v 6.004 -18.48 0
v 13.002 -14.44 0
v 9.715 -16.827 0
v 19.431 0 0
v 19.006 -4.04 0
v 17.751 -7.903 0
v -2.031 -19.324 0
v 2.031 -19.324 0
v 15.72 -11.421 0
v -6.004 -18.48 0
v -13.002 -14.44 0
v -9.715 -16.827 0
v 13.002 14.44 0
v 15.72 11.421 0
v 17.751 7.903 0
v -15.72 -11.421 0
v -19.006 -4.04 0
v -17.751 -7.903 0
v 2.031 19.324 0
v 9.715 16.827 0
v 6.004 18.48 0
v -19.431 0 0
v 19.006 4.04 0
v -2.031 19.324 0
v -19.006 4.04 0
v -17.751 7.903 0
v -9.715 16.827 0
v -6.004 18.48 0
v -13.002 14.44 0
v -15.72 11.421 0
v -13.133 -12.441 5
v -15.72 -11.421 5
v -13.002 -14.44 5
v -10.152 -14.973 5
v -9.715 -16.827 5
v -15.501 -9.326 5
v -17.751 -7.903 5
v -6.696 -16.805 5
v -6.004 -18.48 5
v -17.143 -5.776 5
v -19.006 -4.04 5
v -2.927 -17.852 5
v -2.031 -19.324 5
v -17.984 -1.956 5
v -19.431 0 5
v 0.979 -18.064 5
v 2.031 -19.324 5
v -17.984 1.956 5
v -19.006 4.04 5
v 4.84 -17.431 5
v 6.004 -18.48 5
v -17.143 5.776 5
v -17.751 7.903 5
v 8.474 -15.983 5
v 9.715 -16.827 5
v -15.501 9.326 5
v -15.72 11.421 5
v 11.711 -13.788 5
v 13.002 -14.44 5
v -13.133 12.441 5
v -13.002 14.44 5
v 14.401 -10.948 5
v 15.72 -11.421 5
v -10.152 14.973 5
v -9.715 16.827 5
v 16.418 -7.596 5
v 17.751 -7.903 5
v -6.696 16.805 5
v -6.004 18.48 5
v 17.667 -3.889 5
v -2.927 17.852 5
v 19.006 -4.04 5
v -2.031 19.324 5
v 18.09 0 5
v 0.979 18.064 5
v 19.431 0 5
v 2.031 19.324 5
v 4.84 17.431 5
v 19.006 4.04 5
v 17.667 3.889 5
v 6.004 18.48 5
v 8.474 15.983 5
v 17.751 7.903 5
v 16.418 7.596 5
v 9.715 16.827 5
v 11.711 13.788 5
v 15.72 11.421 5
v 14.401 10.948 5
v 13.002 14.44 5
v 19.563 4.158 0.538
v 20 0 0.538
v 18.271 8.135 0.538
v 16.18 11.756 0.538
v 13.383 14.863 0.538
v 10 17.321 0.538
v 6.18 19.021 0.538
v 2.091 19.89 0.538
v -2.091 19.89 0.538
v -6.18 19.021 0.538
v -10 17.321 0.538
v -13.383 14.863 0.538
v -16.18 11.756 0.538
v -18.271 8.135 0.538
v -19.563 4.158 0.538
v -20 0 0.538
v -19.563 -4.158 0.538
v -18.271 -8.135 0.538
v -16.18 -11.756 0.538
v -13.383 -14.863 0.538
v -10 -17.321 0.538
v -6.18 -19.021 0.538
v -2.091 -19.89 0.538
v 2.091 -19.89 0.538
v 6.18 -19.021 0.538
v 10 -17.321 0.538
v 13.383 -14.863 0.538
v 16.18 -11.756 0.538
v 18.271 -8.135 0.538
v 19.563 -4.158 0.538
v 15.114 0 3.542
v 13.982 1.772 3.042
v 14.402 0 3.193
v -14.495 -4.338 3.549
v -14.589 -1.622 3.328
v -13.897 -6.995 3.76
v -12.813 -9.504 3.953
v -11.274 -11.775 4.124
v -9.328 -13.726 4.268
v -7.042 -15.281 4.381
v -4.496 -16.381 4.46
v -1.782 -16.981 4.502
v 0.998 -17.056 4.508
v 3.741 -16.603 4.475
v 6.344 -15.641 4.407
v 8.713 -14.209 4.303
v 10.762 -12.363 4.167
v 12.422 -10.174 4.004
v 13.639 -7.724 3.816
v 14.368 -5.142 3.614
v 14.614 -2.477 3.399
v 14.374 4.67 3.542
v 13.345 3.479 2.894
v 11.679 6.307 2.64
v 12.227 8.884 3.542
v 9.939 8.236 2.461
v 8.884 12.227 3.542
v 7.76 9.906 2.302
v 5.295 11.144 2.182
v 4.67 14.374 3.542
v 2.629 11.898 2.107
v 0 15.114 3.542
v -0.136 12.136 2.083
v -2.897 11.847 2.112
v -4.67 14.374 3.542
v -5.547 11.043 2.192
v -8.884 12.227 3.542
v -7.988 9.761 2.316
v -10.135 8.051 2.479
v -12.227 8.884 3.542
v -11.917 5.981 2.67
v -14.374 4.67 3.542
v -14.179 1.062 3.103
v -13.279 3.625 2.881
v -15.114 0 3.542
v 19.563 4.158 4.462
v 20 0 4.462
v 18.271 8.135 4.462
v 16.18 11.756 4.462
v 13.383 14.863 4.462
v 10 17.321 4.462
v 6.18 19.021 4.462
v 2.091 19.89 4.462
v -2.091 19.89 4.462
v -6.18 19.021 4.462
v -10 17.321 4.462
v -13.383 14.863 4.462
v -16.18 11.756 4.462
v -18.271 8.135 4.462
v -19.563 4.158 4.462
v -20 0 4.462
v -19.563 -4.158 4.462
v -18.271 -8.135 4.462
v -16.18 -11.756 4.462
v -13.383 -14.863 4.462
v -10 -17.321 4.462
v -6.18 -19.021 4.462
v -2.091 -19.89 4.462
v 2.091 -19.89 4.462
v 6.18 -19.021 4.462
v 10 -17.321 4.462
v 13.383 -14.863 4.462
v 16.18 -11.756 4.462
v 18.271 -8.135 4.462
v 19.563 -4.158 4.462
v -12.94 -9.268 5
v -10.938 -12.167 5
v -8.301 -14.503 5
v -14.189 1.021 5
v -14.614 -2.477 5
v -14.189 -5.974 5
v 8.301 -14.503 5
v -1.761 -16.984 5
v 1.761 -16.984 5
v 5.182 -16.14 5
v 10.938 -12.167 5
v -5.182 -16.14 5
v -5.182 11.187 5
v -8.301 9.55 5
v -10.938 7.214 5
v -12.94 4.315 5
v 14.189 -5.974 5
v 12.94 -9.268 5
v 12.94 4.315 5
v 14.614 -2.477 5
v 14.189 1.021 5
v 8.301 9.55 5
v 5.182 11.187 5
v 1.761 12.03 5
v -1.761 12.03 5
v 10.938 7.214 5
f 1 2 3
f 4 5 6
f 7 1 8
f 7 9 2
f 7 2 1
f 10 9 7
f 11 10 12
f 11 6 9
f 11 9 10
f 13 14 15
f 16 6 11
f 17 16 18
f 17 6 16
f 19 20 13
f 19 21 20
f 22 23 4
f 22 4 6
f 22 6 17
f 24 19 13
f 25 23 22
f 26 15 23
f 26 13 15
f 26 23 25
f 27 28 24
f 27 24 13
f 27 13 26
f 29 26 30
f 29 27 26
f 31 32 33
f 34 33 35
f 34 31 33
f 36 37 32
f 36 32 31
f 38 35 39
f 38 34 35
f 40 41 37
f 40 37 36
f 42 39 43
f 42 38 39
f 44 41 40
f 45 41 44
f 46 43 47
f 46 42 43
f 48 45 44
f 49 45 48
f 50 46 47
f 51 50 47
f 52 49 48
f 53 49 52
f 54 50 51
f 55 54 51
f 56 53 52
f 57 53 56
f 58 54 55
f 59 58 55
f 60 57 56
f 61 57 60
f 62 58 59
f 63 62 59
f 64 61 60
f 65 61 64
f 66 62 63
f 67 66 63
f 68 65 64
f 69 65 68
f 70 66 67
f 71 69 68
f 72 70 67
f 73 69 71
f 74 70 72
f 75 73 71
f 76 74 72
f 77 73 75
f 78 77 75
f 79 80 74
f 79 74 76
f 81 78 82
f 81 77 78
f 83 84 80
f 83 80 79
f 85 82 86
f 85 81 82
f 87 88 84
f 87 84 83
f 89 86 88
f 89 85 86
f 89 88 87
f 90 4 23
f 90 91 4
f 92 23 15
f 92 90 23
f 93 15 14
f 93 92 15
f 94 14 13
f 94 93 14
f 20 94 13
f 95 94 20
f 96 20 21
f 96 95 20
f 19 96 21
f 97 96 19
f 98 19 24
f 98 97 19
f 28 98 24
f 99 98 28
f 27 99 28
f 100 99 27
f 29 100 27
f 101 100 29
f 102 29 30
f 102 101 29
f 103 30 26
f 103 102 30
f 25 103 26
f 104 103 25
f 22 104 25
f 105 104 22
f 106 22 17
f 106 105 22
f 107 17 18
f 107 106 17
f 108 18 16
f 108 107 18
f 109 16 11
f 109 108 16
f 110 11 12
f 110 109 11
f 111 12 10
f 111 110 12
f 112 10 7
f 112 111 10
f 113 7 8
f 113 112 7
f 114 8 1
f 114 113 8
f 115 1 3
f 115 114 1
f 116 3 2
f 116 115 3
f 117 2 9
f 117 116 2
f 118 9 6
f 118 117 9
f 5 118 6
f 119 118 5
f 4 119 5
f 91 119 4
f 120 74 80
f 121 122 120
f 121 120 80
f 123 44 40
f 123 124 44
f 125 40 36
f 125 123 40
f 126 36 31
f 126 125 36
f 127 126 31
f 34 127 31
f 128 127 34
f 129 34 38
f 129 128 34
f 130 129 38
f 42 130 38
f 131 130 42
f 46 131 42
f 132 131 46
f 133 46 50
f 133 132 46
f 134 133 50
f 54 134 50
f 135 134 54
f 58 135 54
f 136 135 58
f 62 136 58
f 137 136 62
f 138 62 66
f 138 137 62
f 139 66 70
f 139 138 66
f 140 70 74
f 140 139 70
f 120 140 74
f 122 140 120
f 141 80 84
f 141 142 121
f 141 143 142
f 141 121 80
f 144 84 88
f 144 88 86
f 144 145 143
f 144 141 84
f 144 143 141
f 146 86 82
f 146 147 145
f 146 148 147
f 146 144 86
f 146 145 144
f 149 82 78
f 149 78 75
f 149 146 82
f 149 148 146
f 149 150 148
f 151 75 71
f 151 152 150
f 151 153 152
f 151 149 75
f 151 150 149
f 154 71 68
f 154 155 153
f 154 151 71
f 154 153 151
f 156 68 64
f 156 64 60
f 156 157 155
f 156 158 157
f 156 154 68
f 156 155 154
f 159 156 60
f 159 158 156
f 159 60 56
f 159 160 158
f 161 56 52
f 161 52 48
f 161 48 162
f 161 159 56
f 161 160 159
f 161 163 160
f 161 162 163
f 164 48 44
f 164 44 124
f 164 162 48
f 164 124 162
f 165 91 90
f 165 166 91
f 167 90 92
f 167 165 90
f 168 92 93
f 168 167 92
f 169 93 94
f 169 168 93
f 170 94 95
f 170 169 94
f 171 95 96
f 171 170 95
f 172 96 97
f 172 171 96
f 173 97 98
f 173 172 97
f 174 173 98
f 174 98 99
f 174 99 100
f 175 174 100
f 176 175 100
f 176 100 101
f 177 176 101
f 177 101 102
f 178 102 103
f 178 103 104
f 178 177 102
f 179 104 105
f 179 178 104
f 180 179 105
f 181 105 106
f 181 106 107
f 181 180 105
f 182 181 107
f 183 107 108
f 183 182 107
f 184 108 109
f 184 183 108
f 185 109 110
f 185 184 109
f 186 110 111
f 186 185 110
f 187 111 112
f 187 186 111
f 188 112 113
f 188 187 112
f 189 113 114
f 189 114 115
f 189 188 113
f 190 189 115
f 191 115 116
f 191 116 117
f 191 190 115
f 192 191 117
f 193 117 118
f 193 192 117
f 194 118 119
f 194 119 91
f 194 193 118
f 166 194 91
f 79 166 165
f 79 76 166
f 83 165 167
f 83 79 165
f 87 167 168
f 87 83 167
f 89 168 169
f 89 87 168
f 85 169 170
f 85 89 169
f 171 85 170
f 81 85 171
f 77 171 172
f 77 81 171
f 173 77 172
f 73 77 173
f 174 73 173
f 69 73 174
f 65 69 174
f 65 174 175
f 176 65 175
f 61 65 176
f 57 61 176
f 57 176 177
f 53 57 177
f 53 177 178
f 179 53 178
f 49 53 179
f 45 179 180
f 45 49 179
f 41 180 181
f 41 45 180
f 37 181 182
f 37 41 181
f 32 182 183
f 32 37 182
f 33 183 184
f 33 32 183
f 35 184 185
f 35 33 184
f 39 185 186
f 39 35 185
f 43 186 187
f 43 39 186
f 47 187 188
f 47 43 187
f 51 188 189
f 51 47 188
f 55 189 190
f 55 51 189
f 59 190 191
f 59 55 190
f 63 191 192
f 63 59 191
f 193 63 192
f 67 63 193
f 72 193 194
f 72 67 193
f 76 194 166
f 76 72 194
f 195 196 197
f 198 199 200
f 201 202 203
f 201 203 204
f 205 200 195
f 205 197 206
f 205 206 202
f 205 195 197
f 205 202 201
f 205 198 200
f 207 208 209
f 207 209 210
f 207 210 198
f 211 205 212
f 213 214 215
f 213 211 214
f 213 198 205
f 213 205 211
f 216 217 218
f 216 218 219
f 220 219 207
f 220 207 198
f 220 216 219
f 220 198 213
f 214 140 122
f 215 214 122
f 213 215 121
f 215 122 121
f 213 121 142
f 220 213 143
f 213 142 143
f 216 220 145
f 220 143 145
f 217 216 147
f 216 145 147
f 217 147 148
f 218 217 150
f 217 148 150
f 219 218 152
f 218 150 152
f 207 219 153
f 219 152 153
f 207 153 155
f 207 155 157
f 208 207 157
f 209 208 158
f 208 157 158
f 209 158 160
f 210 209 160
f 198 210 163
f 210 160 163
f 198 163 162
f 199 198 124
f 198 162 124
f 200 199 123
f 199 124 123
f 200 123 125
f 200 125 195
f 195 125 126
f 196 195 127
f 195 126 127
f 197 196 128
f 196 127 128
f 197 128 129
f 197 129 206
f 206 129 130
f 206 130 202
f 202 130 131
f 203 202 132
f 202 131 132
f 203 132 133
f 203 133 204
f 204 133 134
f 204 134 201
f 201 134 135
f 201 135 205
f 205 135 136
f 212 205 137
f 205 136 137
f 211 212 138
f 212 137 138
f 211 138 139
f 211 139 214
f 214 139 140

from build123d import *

# Parameters (mm, degrees)
F0_R     = 20
F0_R_2   = 1.5
F1_DEPTH = 5
F4_R     = 14.613565
F5_DEPTH = 5


with BuildPart() as f1:
    # F0 (on Top) → F1 (new body)
    with BuildSketch(Plane.XY):
        Circle(F0_R)
        Circle(F0_R_2, mode=Mode.SUBTRACT)
    extrude(amount=F1_DEPTH)

    # F2 (on Front) → F3 (revolve, intersect)
    with BuildSketch(Plane.XZ):
        Polygon((20, 0.538248), (20, 4.461752), (19.430714, 5), (18.09014, 5), (7.885276, 0), (19.430714, 0), align=None)
    revolve(axis=Axis((0, 0, 2.5), (0, 0, 1)), mode=Mode.INTERSECT)

    # F4 (on Top) → F5 (join, through all)
    with BuildSketch(Plane.XY):
        with Locations((0, -2.476576)):
            Circle(F4_R)
    extrude(amount=F5_DEPTH)


solid = f1.part
